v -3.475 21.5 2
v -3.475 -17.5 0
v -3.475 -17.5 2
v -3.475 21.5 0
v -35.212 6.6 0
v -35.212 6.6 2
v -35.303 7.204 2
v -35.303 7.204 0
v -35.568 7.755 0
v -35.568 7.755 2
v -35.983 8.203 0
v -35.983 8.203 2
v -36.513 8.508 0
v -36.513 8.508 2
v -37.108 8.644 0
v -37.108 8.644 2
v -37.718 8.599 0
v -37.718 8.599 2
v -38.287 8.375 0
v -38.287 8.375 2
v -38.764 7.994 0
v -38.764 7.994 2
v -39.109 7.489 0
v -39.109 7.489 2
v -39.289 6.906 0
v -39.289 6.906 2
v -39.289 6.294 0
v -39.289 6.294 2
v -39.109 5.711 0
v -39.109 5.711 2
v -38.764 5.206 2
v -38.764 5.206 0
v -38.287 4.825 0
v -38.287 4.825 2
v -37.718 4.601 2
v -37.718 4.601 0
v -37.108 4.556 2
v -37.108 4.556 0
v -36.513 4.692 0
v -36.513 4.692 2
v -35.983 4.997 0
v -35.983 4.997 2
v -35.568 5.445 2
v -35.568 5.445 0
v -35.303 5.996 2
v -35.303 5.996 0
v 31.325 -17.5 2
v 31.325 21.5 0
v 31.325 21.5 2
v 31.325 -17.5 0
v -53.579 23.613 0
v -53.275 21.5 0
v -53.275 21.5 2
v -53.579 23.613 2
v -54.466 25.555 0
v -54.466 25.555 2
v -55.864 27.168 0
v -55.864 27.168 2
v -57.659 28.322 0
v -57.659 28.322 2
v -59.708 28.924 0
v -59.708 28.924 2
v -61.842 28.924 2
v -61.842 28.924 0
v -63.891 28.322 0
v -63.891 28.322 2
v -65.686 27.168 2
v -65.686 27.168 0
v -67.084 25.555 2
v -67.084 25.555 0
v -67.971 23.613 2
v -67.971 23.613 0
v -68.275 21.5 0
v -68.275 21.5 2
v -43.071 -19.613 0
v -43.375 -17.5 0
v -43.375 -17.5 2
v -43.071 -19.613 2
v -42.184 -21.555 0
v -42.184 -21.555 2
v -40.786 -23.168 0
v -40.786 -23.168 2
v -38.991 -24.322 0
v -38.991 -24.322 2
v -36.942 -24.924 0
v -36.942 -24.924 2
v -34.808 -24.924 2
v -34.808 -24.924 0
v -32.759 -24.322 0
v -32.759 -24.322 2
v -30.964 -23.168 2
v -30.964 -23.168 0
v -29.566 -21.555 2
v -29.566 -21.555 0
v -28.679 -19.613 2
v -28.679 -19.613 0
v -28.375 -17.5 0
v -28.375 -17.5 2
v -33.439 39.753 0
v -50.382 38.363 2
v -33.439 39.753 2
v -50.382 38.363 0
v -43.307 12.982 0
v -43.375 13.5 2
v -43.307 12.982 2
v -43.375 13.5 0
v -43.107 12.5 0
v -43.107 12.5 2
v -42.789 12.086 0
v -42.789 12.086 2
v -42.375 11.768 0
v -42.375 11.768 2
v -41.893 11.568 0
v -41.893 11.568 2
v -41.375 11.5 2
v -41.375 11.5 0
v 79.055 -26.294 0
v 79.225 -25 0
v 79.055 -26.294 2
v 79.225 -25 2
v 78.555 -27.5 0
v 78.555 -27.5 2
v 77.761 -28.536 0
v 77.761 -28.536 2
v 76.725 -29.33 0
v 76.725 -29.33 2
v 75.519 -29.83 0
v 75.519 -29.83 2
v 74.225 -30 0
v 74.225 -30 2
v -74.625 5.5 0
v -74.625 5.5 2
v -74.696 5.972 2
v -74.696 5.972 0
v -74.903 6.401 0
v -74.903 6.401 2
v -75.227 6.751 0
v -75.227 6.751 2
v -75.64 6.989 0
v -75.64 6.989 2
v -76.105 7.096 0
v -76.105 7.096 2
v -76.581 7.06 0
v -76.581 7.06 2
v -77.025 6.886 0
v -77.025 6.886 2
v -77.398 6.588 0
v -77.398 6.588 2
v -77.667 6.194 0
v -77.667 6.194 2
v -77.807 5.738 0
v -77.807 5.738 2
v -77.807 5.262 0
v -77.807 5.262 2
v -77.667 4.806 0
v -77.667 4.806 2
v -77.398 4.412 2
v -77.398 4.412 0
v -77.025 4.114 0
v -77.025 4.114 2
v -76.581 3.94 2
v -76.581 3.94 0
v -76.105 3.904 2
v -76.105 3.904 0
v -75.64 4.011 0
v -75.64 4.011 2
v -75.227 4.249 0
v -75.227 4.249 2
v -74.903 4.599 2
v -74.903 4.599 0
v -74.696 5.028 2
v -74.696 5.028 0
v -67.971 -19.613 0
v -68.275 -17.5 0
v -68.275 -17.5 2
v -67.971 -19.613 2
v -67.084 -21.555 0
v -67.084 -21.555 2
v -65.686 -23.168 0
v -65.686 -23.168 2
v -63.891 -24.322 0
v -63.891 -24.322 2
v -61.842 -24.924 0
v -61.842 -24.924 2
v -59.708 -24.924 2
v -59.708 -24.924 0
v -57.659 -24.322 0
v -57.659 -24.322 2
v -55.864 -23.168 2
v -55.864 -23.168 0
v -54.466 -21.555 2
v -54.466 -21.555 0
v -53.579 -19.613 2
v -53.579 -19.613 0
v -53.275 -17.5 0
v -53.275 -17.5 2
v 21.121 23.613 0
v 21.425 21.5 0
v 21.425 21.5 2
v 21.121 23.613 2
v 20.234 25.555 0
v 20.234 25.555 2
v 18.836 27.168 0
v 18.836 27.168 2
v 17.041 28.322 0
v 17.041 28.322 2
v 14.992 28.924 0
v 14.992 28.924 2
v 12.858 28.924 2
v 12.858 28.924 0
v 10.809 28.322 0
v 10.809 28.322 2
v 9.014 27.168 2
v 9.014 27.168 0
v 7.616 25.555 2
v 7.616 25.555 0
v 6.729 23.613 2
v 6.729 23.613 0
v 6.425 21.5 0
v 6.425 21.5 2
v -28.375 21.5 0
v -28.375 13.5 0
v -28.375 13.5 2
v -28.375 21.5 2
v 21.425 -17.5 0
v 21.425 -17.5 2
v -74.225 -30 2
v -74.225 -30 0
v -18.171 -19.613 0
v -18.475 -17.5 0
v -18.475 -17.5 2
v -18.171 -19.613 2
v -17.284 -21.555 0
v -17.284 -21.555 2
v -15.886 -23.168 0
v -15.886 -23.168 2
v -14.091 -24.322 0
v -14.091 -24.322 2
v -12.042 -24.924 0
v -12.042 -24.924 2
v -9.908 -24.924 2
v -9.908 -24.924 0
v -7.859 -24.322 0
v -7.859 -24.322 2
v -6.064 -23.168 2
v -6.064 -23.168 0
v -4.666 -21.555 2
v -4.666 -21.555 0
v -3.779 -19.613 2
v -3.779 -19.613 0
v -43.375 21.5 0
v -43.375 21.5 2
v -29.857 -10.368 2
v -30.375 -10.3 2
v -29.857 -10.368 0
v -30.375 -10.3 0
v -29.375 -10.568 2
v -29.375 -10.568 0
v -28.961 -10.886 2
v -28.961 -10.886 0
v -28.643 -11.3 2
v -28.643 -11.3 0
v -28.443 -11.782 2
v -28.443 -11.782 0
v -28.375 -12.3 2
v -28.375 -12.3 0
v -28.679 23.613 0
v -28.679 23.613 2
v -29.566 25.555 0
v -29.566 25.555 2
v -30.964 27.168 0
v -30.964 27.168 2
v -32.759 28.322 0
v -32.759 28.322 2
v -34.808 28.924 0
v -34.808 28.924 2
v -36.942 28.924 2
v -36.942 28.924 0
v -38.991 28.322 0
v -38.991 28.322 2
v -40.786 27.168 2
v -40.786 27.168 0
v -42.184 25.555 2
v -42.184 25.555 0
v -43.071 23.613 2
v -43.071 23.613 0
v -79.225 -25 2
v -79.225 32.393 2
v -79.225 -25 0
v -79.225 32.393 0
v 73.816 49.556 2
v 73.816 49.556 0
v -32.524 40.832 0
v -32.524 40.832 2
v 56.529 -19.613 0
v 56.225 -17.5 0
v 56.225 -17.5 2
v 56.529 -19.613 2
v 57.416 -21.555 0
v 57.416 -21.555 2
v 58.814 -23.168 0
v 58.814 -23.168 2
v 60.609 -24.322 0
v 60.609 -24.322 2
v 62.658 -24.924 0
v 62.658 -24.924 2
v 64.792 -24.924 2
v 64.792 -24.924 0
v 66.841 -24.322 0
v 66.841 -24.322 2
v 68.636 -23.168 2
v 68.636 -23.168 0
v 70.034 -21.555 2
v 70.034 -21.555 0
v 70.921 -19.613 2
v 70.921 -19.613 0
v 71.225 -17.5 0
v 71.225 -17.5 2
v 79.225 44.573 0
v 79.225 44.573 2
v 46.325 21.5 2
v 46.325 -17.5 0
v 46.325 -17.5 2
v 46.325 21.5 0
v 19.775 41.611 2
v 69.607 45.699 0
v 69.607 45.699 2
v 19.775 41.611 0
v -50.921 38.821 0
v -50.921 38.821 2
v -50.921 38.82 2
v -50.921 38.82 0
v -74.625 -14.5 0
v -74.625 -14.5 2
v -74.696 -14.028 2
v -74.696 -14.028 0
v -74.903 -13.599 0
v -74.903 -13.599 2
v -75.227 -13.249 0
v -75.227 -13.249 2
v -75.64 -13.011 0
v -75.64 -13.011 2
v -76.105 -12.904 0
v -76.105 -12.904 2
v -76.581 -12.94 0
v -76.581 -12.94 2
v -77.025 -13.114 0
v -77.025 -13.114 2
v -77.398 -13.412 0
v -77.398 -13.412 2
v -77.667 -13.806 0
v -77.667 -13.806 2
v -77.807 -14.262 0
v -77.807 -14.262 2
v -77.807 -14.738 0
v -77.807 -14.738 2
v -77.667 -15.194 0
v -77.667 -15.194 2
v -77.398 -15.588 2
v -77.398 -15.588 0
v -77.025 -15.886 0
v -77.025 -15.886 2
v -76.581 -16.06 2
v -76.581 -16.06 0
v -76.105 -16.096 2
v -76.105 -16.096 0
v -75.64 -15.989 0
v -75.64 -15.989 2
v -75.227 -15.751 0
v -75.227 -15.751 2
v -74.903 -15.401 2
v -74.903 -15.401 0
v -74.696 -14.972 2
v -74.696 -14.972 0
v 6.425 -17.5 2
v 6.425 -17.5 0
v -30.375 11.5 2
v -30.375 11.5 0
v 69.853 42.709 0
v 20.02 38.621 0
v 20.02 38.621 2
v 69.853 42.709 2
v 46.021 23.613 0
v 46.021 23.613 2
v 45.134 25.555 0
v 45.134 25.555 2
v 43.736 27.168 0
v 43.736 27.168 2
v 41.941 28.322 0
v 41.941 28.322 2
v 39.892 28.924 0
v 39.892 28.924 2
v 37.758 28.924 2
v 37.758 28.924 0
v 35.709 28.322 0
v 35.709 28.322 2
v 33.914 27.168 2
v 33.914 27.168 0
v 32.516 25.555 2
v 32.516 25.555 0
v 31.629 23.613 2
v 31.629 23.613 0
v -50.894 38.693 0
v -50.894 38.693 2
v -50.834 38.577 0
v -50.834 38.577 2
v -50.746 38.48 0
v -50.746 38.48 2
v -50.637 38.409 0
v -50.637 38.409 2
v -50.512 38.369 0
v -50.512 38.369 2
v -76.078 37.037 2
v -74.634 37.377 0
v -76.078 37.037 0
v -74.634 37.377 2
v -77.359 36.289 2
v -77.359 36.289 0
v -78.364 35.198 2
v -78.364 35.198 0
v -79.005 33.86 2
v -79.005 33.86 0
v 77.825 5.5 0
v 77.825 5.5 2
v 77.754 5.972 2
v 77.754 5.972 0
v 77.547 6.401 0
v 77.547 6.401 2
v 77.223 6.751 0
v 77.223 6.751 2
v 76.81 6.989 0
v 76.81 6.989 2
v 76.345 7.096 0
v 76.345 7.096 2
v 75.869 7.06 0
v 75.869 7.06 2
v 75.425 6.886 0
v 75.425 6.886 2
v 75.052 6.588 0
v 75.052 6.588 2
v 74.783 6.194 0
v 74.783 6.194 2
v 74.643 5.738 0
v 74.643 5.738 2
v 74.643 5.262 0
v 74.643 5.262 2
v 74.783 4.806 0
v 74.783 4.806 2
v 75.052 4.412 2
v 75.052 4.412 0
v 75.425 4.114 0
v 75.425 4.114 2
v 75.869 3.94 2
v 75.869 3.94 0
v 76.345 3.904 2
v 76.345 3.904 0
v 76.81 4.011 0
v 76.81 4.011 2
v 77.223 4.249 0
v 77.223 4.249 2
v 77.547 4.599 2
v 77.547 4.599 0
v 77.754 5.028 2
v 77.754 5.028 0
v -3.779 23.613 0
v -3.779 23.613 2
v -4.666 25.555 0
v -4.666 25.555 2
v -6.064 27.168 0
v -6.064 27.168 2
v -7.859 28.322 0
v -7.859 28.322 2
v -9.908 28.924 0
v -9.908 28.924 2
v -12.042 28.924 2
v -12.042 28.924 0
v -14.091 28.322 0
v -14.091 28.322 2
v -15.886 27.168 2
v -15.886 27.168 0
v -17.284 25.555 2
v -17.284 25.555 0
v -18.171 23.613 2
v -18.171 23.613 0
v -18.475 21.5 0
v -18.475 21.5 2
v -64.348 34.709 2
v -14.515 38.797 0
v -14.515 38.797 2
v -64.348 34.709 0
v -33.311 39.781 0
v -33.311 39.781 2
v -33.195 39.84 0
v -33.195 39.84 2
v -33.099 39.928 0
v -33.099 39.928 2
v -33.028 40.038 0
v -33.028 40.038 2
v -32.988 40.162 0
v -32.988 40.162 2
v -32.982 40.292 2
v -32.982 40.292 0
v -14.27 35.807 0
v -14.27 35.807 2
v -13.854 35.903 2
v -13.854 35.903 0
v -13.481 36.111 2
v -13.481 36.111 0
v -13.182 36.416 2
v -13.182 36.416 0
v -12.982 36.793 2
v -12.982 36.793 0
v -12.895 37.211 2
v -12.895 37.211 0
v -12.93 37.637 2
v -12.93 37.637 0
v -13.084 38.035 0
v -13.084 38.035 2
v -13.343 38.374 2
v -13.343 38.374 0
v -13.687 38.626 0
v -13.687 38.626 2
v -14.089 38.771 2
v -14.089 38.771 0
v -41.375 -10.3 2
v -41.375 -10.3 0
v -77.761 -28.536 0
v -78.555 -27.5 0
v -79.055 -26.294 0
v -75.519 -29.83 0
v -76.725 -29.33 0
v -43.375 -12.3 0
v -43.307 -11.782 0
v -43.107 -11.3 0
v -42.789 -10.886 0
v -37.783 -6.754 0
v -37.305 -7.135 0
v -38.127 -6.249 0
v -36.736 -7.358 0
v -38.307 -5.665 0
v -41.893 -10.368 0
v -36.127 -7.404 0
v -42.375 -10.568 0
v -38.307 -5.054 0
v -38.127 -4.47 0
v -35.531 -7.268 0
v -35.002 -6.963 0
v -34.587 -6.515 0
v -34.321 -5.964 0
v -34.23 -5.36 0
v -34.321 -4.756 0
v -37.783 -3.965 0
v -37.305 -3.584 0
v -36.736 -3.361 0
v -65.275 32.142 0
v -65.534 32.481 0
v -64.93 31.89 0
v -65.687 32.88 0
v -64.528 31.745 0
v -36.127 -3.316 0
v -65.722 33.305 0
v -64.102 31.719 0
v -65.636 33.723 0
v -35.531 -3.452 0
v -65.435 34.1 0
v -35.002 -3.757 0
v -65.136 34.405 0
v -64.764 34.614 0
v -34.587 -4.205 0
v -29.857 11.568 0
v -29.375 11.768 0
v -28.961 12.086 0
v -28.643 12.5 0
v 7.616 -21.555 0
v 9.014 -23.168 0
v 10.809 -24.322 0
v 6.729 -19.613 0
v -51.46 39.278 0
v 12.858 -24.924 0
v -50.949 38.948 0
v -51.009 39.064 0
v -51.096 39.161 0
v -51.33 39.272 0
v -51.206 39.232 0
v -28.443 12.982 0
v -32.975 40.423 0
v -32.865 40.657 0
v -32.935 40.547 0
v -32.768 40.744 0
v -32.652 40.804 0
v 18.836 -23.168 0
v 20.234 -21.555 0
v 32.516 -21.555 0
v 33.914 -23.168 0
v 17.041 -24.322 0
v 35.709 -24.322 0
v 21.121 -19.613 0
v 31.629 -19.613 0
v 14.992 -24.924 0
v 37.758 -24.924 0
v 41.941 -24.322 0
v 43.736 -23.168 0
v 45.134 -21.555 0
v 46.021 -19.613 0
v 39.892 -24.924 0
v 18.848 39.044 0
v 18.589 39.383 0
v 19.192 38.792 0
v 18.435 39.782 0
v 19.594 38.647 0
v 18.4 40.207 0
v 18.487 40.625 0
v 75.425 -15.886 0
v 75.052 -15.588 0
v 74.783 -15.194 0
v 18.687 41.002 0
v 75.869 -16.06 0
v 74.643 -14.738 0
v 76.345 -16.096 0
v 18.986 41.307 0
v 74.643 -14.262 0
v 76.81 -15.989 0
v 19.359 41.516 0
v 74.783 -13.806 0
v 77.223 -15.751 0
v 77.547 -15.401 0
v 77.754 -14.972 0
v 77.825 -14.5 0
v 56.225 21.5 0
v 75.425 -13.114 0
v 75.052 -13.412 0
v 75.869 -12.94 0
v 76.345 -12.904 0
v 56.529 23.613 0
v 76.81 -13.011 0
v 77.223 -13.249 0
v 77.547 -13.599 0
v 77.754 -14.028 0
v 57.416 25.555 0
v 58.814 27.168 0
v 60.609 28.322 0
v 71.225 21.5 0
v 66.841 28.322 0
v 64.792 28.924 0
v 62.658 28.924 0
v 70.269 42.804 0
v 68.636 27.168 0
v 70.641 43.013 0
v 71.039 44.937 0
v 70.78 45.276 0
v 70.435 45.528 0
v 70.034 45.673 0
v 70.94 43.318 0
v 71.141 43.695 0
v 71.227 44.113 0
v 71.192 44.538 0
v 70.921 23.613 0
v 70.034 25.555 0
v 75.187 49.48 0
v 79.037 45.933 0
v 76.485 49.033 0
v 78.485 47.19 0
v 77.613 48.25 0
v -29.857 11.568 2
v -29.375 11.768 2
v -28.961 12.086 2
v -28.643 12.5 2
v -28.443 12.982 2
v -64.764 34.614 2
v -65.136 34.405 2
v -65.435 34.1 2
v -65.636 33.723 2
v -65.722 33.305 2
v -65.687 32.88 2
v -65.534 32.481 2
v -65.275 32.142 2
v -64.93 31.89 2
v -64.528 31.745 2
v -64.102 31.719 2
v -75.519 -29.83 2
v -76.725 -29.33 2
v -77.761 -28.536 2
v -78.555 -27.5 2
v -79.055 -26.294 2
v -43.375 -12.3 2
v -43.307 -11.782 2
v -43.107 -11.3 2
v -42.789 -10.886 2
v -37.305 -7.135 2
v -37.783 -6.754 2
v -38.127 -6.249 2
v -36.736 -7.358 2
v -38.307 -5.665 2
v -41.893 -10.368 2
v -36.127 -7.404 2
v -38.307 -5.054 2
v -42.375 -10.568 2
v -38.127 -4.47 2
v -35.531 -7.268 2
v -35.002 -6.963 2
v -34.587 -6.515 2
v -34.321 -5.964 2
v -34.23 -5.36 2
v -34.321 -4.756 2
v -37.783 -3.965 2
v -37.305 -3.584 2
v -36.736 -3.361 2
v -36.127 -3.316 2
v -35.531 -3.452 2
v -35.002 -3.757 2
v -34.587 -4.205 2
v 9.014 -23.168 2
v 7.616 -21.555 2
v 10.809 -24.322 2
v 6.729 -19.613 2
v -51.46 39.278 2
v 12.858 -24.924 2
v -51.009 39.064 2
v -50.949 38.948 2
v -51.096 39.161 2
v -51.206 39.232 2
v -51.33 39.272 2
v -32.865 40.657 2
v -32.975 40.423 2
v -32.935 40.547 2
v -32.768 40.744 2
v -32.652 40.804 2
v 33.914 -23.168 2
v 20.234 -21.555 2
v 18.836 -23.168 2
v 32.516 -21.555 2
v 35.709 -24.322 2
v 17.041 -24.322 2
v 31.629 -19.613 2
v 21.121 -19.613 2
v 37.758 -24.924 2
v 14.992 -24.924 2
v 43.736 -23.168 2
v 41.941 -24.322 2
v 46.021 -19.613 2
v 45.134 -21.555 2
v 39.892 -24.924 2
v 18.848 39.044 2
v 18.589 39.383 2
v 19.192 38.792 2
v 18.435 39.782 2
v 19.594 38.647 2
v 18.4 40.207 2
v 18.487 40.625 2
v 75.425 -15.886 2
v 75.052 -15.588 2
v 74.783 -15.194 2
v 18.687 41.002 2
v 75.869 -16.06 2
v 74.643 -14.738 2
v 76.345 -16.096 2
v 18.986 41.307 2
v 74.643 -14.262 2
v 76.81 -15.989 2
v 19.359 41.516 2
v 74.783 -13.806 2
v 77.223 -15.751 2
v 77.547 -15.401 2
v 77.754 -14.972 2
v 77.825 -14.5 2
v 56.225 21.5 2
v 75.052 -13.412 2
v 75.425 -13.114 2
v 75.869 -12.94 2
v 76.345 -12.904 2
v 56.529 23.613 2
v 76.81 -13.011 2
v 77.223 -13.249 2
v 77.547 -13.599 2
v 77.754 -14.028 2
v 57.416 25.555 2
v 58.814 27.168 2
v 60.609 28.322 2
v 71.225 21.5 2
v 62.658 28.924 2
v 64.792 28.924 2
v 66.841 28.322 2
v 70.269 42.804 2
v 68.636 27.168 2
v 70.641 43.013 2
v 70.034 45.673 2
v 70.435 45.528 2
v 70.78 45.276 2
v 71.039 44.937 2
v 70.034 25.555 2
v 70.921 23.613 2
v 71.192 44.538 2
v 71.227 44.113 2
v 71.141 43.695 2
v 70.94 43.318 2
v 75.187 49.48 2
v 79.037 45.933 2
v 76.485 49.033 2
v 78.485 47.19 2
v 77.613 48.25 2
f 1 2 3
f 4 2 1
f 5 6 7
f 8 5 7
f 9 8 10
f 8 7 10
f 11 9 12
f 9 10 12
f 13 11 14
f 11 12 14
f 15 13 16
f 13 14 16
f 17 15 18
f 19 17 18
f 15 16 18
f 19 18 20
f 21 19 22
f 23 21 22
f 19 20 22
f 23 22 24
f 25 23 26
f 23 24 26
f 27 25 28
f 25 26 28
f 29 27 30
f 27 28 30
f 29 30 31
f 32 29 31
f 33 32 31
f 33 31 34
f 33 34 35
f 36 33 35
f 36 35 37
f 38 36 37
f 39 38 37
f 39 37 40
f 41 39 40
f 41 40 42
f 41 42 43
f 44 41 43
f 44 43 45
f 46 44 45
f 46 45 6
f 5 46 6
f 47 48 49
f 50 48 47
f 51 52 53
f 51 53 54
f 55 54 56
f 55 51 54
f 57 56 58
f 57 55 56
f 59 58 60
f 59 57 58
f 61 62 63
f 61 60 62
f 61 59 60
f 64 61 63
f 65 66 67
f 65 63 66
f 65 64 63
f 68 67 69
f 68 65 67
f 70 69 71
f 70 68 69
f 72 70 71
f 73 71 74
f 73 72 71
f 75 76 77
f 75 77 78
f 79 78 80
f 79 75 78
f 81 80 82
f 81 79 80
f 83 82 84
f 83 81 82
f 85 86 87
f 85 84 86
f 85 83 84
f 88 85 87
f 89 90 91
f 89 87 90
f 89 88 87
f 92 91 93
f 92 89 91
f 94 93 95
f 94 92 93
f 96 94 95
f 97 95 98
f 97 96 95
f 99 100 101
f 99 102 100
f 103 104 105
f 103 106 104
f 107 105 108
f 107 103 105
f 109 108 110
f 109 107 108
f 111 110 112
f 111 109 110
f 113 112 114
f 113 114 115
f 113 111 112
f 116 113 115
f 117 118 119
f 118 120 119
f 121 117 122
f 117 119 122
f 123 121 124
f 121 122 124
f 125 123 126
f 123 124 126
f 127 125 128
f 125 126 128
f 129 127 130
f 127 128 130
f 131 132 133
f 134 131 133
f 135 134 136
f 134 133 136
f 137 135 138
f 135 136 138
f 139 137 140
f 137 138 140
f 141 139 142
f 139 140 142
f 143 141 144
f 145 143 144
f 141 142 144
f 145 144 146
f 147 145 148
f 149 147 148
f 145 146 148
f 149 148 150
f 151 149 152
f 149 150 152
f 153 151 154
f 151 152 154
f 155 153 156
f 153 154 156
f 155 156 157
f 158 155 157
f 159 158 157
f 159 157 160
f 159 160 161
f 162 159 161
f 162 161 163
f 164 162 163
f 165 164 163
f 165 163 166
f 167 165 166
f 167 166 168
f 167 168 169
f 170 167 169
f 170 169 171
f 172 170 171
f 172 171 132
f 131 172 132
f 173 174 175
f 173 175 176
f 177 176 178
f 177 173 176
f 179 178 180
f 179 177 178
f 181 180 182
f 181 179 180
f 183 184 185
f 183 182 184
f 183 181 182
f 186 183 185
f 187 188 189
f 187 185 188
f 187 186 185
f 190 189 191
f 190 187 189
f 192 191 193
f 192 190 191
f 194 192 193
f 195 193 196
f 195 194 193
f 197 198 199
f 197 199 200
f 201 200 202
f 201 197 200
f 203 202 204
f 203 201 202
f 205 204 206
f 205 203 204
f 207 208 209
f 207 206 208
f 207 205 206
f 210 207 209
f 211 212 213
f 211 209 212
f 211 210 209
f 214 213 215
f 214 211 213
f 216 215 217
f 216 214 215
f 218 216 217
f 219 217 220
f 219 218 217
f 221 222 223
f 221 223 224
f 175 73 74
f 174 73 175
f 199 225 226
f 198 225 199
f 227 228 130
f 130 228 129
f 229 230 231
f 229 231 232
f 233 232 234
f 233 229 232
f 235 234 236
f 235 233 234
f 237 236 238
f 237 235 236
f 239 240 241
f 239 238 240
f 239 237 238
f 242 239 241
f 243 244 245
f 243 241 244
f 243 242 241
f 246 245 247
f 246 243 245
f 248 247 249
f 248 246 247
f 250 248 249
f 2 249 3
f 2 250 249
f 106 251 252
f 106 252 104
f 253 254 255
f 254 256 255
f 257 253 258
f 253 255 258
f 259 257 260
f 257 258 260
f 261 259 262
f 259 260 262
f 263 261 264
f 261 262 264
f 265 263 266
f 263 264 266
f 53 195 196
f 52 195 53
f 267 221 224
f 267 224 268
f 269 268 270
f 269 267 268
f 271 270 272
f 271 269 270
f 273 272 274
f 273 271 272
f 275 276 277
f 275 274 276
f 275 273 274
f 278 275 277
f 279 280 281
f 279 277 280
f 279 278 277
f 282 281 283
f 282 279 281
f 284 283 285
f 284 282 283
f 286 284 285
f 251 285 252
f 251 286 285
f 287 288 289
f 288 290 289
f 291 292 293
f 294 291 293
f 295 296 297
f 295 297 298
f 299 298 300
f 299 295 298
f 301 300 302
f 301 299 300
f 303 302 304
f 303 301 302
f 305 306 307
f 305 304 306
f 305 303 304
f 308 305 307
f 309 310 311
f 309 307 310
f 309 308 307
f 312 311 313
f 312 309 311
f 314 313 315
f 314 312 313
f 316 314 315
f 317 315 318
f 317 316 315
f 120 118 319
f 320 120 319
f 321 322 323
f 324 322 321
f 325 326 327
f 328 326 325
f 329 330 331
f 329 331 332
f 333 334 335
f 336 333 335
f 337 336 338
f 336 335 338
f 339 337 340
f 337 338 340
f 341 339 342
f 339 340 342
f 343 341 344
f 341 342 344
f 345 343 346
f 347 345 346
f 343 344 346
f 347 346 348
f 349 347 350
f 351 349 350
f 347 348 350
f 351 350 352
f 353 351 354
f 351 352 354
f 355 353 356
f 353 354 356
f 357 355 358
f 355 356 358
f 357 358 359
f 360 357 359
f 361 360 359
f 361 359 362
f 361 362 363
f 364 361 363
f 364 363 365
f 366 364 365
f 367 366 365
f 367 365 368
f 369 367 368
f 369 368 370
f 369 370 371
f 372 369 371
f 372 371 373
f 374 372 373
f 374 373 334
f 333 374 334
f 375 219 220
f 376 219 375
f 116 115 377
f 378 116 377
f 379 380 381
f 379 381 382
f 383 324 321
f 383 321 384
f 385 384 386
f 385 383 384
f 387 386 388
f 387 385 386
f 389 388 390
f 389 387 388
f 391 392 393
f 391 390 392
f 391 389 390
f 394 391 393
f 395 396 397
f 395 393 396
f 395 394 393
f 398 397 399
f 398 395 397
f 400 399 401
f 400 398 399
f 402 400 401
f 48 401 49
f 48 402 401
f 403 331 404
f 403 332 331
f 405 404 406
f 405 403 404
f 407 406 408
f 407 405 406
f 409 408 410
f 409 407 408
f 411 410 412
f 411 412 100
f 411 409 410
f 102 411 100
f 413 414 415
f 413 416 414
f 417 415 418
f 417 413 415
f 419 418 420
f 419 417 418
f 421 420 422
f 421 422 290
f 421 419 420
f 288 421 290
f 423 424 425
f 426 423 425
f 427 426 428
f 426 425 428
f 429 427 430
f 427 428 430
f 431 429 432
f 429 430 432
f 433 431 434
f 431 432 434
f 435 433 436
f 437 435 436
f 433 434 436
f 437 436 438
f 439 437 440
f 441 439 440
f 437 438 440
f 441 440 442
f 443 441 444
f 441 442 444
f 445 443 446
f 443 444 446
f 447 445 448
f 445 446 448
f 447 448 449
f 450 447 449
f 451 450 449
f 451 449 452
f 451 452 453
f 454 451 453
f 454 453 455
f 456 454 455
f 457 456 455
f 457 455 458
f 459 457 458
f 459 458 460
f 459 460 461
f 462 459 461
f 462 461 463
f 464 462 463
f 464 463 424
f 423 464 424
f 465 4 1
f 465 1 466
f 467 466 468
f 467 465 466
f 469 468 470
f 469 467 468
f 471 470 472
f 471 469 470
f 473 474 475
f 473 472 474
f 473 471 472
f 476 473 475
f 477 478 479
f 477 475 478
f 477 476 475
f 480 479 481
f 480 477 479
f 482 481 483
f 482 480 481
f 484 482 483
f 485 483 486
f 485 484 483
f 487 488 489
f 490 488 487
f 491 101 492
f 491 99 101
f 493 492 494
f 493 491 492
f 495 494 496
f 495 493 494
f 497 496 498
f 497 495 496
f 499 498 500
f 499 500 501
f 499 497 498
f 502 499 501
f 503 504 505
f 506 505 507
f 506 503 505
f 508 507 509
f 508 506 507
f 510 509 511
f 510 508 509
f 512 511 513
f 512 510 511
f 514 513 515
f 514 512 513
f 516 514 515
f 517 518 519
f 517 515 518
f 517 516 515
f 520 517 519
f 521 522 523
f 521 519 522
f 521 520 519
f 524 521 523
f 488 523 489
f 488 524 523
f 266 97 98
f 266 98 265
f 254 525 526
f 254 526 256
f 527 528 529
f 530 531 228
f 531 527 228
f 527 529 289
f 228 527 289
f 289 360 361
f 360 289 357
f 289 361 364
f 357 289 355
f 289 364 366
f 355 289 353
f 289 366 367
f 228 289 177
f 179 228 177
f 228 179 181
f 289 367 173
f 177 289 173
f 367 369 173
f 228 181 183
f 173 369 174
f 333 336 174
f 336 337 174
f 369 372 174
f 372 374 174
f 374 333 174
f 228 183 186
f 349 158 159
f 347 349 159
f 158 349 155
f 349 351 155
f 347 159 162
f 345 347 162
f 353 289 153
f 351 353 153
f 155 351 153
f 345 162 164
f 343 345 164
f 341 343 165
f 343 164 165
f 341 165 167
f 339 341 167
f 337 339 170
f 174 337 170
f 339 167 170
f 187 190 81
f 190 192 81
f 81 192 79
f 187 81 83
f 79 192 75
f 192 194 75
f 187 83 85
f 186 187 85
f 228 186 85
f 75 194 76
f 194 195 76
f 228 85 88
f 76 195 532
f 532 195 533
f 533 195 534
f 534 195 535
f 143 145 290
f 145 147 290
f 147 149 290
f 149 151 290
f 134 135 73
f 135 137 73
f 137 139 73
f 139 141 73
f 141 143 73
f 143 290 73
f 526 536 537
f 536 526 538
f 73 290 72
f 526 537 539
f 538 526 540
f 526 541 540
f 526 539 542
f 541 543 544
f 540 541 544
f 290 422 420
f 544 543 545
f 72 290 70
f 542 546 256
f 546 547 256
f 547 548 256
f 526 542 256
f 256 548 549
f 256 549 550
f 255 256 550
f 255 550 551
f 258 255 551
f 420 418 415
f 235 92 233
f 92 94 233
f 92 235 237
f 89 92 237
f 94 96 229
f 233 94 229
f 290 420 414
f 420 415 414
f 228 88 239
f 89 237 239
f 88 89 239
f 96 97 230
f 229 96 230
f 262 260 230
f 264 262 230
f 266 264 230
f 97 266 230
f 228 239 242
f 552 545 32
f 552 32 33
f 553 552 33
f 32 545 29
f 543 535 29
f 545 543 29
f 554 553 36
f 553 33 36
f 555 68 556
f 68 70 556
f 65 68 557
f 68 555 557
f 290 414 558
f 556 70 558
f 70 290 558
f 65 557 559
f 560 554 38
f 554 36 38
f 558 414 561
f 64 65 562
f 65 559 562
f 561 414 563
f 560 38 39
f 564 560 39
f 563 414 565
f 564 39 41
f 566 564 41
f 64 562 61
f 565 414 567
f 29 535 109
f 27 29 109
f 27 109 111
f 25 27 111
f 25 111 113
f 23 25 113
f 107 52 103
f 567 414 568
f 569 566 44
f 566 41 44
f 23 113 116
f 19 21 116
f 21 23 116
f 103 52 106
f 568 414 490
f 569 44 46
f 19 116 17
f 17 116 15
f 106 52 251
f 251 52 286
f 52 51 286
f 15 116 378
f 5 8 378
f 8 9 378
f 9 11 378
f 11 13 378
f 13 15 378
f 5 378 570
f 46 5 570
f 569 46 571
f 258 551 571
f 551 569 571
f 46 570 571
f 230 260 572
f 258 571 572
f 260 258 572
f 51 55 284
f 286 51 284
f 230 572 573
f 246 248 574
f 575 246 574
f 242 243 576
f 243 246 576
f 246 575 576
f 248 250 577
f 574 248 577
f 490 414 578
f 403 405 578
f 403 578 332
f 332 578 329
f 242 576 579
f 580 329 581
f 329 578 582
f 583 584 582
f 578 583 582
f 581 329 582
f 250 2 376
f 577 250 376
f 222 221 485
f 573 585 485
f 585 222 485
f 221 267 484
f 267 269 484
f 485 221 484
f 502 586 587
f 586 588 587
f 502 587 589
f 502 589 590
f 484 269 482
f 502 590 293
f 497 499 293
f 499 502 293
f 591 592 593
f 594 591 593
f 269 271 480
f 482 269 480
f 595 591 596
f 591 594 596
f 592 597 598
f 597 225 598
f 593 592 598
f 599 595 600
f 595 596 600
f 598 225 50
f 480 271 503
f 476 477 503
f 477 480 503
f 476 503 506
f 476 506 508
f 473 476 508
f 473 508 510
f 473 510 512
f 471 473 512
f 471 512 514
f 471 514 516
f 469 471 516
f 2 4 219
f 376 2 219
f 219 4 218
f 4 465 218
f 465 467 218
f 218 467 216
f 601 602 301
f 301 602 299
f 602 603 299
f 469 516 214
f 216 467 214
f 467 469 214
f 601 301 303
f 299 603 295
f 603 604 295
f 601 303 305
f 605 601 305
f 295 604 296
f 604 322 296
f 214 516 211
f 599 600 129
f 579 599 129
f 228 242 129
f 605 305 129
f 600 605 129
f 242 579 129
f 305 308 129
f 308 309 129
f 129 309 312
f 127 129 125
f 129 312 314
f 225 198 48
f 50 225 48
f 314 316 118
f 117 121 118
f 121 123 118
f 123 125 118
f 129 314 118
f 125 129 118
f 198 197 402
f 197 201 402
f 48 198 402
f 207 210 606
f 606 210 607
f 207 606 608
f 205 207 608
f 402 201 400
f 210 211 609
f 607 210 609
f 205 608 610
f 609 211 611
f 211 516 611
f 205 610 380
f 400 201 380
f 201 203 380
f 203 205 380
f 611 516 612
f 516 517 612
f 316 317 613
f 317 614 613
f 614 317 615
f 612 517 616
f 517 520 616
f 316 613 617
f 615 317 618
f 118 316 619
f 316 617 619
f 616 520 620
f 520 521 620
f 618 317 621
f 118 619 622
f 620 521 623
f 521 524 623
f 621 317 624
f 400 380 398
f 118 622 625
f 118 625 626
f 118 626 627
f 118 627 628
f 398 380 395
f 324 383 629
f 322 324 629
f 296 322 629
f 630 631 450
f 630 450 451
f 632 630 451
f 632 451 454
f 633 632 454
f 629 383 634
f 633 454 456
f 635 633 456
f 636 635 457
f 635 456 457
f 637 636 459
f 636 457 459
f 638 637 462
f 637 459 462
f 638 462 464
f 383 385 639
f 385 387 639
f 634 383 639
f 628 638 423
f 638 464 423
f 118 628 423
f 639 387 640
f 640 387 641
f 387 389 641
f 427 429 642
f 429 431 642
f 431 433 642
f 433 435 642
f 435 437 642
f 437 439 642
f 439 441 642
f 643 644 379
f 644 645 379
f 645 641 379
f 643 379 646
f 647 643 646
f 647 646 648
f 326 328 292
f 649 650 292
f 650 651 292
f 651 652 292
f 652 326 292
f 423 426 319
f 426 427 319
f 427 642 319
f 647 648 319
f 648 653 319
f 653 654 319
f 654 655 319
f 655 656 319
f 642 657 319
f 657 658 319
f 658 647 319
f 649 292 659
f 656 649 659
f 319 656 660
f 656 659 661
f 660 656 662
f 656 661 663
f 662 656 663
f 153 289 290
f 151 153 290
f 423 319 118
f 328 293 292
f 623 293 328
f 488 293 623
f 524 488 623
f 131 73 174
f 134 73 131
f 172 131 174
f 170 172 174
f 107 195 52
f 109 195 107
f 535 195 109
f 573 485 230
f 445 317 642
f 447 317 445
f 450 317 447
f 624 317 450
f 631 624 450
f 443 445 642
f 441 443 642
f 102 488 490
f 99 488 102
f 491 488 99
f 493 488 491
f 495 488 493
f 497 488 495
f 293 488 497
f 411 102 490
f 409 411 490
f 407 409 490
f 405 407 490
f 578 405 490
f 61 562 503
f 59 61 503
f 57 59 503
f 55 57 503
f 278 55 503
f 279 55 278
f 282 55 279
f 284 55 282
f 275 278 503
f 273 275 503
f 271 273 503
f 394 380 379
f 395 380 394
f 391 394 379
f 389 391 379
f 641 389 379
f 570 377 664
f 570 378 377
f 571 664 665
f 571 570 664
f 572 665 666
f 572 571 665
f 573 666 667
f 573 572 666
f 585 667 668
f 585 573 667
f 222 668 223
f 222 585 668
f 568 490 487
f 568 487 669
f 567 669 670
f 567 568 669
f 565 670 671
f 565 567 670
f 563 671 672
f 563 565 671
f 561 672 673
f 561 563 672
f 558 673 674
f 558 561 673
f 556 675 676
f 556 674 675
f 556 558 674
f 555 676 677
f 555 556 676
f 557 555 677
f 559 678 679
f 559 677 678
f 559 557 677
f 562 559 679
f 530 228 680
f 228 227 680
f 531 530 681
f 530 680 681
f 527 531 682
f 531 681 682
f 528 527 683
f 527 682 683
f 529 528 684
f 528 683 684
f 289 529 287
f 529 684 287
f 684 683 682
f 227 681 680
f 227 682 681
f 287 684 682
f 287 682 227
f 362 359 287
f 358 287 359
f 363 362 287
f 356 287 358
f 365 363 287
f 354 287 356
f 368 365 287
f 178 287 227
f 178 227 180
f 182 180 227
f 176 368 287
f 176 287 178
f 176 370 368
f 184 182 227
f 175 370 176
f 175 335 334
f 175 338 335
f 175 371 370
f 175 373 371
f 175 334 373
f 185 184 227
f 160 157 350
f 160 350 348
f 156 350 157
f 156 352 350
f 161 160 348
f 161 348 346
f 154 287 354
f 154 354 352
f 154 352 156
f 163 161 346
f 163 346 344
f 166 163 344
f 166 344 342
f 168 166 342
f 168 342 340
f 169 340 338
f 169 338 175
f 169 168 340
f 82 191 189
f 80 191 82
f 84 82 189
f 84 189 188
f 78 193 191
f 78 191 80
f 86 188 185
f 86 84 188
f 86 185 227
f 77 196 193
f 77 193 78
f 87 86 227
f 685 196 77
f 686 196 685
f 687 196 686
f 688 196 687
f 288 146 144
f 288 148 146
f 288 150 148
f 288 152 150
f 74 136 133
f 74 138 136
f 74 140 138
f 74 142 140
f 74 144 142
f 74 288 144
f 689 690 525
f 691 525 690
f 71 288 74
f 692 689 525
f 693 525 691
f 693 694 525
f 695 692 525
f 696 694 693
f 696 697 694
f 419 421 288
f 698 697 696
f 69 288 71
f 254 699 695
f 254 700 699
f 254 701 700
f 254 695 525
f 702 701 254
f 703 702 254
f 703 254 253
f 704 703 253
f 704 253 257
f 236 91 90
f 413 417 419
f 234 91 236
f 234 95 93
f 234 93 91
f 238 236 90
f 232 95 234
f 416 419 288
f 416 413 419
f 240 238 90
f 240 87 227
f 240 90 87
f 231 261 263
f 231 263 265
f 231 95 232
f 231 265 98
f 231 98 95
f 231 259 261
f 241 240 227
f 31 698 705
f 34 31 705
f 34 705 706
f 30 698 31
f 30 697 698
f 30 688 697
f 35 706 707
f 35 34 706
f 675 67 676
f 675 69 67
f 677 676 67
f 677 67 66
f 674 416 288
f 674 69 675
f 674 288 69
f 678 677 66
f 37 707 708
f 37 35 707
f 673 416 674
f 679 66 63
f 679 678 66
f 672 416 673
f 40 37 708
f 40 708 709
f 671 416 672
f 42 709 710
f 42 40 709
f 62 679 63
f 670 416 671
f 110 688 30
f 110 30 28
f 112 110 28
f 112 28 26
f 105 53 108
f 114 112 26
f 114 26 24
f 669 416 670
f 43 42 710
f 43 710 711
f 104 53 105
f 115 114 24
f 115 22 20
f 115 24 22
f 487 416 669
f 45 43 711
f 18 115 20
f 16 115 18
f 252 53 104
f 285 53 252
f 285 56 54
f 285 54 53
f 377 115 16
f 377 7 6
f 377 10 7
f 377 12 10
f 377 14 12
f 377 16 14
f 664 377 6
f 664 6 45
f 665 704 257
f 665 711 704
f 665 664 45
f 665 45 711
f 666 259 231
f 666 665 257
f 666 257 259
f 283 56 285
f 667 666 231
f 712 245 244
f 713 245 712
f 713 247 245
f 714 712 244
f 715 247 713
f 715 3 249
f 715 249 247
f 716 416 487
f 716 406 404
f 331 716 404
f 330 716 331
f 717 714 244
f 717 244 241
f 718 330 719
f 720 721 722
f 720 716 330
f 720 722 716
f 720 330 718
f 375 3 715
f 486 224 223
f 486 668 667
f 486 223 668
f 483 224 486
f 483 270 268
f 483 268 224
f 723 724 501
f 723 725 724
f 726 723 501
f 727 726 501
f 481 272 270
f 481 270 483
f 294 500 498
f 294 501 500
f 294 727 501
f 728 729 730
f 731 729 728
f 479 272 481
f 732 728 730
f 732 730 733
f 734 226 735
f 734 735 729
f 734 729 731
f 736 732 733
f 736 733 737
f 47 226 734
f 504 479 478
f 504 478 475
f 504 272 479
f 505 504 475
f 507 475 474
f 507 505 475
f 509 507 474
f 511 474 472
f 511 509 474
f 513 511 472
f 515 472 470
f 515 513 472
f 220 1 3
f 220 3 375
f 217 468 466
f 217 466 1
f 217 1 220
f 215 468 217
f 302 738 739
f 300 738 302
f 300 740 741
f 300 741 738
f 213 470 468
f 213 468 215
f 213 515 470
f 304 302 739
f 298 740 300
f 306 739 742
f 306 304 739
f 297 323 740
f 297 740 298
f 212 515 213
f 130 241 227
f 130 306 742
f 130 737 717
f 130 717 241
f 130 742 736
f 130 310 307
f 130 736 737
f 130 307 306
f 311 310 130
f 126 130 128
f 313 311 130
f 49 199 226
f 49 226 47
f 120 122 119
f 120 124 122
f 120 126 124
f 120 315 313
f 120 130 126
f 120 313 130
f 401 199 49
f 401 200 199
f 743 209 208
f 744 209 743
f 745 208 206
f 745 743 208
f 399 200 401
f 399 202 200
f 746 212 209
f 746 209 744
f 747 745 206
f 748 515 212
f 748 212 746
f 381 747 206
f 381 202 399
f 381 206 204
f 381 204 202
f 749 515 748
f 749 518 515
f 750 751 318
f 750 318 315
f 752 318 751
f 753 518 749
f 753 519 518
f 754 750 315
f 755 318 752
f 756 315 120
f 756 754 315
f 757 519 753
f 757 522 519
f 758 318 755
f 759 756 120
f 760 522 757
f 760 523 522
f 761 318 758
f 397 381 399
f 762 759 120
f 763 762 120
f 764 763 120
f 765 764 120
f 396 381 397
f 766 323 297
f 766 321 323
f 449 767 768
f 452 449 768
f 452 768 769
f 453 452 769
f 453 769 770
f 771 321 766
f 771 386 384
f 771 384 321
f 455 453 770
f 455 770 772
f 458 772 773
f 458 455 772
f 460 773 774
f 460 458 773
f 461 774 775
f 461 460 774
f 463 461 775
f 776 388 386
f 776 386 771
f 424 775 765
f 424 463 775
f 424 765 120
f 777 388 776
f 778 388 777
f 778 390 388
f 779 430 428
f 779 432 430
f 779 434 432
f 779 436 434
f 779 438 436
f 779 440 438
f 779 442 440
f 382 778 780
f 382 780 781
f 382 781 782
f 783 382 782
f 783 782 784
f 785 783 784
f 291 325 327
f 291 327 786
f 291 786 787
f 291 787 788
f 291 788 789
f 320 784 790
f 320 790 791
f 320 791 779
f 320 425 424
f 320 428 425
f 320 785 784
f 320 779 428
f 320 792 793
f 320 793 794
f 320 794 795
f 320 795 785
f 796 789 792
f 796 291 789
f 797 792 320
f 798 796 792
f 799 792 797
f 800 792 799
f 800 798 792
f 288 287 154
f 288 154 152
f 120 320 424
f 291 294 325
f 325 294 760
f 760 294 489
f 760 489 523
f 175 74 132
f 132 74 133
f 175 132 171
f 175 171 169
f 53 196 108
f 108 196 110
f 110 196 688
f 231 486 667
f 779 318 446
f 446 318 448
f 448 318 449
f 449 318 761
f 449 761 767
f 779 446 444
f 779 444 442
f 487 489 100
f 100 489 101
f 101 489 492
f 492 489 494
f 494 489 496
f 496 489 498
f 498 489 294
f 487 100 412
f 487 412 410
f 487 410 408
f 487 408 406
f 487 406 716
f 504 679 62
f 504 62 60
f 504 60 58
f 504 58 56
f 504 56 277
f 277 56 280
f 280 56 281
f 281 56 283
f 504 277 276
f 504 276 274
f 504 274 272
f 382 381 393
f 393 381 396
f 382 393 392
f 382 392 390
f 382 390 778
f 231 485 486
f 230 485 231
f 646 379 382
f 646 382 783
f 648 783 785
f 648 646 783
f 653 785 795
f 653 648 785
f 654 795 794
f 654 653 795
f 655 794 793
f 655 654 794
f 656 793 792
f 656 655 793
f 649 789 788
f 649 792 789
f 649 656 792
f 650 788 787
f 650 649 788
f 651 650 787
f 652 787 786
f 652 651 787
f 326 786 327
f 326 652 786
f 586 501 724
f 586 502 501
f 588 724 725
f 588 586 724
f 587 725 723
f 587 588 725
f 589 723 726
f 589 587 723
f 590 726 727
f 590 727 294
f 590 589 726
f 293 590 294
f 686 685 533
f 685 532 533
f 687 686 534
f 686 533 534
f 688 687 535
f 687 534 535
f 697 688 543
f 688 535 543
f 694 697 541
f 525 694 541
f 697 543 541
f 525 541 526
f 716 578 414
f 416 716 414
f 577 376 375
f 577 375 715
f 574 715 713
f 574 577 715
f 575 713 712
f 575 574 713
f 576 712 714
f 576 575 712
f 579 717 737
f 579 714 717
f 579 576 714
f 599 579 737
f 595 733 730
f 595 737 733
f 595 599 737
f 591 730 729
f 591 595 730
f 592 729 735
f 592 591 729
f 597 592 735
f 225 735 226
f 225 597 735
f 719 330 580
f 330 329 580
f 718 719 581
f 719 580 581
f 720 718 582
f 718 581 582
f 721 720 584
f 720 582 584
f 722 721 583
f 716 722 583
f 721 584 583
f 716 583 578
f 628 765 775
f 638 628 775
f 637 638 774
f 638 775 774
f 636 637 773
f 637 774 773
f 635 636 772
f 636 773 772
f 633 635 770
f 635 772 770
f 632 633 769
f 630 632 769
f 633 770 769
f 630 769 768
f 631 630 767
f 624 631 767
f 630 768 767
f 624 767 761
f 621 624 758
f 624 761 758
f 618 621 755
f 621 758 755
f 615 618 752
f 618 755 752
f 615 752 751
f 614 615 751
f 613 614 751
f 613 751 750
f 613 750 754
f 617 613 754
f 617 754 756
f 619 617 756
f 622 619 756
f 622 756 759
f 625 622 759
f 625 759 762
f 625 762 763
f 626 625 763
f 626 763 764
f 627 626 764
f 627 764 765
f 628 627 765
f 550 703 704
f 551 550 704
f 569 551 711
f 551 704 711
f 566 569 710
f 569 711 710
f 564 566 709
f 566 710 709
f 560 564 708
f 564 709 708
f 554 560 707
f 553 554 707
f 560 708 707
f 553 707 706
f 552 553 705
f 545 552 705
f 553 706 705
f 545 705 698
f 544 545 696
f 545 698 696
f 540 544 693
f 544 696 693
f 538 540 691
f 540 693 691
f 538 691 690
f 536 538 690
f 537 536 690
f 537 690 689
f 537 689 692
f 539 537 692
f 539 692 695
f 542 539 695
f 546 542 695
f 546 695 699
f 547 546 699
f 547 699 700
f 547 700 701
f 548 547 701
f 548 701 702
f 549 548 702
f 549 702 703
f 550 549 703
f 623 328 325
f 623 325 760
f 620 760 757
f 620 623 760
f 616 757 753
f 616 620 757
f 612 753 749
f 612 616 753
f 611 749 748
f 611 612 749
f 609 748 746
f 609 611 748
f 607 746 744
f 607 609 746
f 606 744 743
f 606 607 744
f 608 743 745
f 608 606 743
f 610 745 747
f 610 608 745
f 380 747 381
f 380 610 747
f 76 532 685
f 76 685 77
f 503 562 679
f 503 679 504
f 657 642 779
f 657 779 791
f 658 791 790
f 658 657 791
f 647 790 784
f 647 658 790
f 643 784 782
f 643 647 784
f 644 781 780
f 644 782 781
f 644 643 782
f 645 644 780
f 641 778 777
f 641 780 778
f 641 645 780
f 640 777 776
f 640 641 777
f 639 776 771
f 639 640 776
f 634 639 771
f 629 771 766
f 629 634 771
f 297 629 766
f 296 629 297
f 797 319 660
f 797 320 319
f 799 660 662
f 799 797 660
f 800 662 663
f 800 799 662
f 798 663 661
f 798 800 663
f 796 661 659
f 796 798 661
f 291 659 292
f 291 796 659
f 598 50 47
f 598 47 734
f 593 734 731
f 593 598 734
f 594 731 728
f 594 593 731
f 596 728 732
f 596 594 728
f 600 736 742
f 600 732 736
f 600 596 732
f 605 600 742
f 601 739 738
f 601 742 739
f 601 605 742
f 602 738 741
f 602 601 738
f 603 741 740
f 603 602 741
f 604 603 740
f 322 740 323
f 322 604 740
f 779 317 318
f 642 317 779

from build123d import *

# Parameters (mm, degrees)
SKETCH_1_W             = 158.45
SKETCH_1_H             = 60
EXTRUDE_1_DEPTH        = 2
SKETCH_2_R             = 1.6
CUT_EXTRUDE_1_DEPTH    = 10
EXTRUDE_2_DEPTH        = 2
CUT_EXTRUDE_2_DEPTH    = 10
PATTERN_LINEAR_1_COUNT = 6
PATTERN_LINEAR_1_PITCH = 24.9
FILLET_1_R             = 5
CUT_EXTRUDE_3_DEPTH    = 10
SKETCH_6_W             = 15
SKETCH_6_H             = 21.8
EXTRUDE_3_DEPTH        = 2
SKETCH_7_R             = 2.05
CUT_EXTRUDE_4_DEPTH    = 10
FILLET_2_R             = 2
SKETCH_8_W             = 18
SKETCH_8_H             = 2
CUT_EXTRUDE_5_DEPTH    = 1
FILLET_3_R             = 0.5


with BuildPart() as part:
    # 草图1 → 凸台-拉伸1 (new body)
    with BuildSketch(Plane.XY):
        Rectangle(SKETCH_1_W, SKETCH_1_H)
    extrude(amount=EXTRUDE_1_DEPTH)

    # 草图2 → 切除-拉伸1 (cut)
    with BuildSketch(Plane.XY.offset(2)):
        with Locations((-76.225, -14.5)):
            Circle(SKETCH_2_R)
        with Locations((-76.225, 5.5)):
            Circle(SKETCH_2_R)
        with Locations((76.225, -14.5)):
            Circle(SKETCH_2_R)
        with Locations((76.225, 5.5)):
            Circle(SKETCH_2_R)
    extrude(amount=-CUT_EXTRUDE_1_DEPTH, mode=Mode.SUBTRACT)

    # 草图3 → 凸台-拉伸2 (add)
    with BuildSketch(Plane(origin=(0, 0, 0), x_dir=(-1, 0, 0), z_dir=(0, 0, -1))):
        Polygon((-79.225, 30), (-79.225, 50), (79.225, 37), (79.225, 30), align=None)
    extrude(amount=-EXTRUDE_2_DEPTH)

    # 草图4 → 切除-拉伸2 (cut)
    with BuildSketch(Plane(origin=(0, 0, 0), x_dir=(-1, 0, 0), z_dir=(0, 0, -1))):
        with BuildLine():
            Line((-56.225, 21.5), (-56.225, -17.5))
            ThreePointArc((-56.225, -17.5), (-63.725, -25), (-71.225, -17.5))
            Line((-71.225, -17.5), (-71.225, 21.5))
            ThreePointArc((-71.225, 21.5), (-63.725, 29), (-56.225, 21.5))
        make_face()
    cut_extrude_2 = extrude(amount=-CUT_EXTRUDE_2_DEPTH, mode=Mode.SUBTRACT)

    # 阵列(线性)1: 切除-拉伸2 ×6
    with Locations(*[(-i * PATTERN_LINEAR_1_PITCH, 0, 0) for i in range(1, PATTERN_LINEAR_1_COUNT)]):
        add(cut_extrude_2, mode=Mode.SUBTRACT)

    # 圆角1
    fillet_1_edges = [part.edges().sort_by_distance(p)[0] for p in [
        (79.225, 50, 1),
        (-79.225, 37, 1),
        (79.225, -30, 1),
        (-79.225, -30, 1),
    ]]
    fillet(fillet_1_edges, radius=FILLET_1_R)

    # 草图5 → 切除-拉伸3 (cut)
    with BuildSketch(Plane(origin=(0, 0, 0), x_dir=(-1, 0, 0), z_dir=(0, 0, -1))):
        with BuildLine():
            Line((-69.607368079, 45.699163119), (-19.774807001, 41.610660159))
            ThreePointArc((-19.774807001, 41.610660159), (-18.402485258, 39.993028237), (-20.020117179, 38.620706494))
            Line((-20.020117179, 38.620706494), (-69.852678256, 42.709209454))
            ThreePointArc((-69.852678256, 42.709209454), (-71.225, 44.326841375), (-69.607368079, 45.699163119))
        make_face()
        with BuildLine():
            Line((14.515094011, 38.797351776), (64.347655089, 34.708848816))
            ThreePointArc((64.347655089, 34.708848816), (65.719976832, 33.091216895), (64.102344911, 31.718895152))
            Line((64.102344911, 31.718895152), (14.269783834, 35.807398112))
            ThreePointArc((14.269783834, 35.807398112), (12.89746209, 37.425030033), (14.515094011, 38.797351776))
        make_face()
    extrude(amount=-CUT_EXTRUDE_3_DEPTH, mode=Mode.SUBTRACT)

    # 草图6 → 凸台-拉伸3 (add)
    with BuildSketch(Plane.XY.offset(2)):
        with Locations((-35.875, 0.6)):
            Rectangle(SKETCH_6_W, SKETCH_6_H)
    extrude(amount=-EXTRUDE_3_DEPTH)

    # 草图7 → 切除-拉伸4 (cut)
    with BuildSketch(Plane.XY.offset(2)):
        with Locations((-37.261557274, 6.6)):
            Circle(SKETCH_7_R)
        with Locations((-36.280316563, -5.359814659)):
            Circle(SKETCH_7_R)
    extrude(amount=-CUT_EXTRUDE_4_DEPTH, mode=Mode.SUBTRACT)

    # 圆角2
    fillet_2_edges = [part.edges().sort_by_distance(p)[0] for p in [
        (-28.375, -10.3, 1),
        (-28.375, 11.5, 1),
        (-43.375, 11.5, 1),
        (-43.375, -10.3, 1),
    ]]
    fillet(fillet_2_edges, radius=FILLET_2_R)

    # 草图8 → 切除-拉伸5 (cut)
    with BuildSketch(Plane(origin=(-3.545085978, 43.209144098, 0), x_dir=(0.9966512215507048, 0.08177005919948983, 0), z_dir=(-0.08177005919948983, 0.9966512215507048, 0))):
        with Locations((-38.57643531, -1)):
            Rectangle(SKETCH_8_W, SKETCH_8_H)
    extrude(amount=-CUT_EXTRUDE_5_DEPTH, mode=Mode.SUBTRACT)

    # 圆角3
    fillet_3_edges = [part.edges().sort_by_distance(p)[0] for p in [
        (-50.880428288, 38.322164944, 1),
        (-32.9407063, 39.79402601, 1),
    ]]
    fillet(fillet_3_edges, radius=FILLET_3_R)
    fillet_3_2_edges = [part.edges().sort_by_distance(p)[0] for p in [
        (-50.962198347, 39.318816166, 1),
        (-33.022476359, 40.790677231, 1),
    ]]
    fillet(fillet_3_2_edges, radius=FILLET_3_R - 0.0001)  # a hair under: the kernel refuses the full size


solid = part.part
